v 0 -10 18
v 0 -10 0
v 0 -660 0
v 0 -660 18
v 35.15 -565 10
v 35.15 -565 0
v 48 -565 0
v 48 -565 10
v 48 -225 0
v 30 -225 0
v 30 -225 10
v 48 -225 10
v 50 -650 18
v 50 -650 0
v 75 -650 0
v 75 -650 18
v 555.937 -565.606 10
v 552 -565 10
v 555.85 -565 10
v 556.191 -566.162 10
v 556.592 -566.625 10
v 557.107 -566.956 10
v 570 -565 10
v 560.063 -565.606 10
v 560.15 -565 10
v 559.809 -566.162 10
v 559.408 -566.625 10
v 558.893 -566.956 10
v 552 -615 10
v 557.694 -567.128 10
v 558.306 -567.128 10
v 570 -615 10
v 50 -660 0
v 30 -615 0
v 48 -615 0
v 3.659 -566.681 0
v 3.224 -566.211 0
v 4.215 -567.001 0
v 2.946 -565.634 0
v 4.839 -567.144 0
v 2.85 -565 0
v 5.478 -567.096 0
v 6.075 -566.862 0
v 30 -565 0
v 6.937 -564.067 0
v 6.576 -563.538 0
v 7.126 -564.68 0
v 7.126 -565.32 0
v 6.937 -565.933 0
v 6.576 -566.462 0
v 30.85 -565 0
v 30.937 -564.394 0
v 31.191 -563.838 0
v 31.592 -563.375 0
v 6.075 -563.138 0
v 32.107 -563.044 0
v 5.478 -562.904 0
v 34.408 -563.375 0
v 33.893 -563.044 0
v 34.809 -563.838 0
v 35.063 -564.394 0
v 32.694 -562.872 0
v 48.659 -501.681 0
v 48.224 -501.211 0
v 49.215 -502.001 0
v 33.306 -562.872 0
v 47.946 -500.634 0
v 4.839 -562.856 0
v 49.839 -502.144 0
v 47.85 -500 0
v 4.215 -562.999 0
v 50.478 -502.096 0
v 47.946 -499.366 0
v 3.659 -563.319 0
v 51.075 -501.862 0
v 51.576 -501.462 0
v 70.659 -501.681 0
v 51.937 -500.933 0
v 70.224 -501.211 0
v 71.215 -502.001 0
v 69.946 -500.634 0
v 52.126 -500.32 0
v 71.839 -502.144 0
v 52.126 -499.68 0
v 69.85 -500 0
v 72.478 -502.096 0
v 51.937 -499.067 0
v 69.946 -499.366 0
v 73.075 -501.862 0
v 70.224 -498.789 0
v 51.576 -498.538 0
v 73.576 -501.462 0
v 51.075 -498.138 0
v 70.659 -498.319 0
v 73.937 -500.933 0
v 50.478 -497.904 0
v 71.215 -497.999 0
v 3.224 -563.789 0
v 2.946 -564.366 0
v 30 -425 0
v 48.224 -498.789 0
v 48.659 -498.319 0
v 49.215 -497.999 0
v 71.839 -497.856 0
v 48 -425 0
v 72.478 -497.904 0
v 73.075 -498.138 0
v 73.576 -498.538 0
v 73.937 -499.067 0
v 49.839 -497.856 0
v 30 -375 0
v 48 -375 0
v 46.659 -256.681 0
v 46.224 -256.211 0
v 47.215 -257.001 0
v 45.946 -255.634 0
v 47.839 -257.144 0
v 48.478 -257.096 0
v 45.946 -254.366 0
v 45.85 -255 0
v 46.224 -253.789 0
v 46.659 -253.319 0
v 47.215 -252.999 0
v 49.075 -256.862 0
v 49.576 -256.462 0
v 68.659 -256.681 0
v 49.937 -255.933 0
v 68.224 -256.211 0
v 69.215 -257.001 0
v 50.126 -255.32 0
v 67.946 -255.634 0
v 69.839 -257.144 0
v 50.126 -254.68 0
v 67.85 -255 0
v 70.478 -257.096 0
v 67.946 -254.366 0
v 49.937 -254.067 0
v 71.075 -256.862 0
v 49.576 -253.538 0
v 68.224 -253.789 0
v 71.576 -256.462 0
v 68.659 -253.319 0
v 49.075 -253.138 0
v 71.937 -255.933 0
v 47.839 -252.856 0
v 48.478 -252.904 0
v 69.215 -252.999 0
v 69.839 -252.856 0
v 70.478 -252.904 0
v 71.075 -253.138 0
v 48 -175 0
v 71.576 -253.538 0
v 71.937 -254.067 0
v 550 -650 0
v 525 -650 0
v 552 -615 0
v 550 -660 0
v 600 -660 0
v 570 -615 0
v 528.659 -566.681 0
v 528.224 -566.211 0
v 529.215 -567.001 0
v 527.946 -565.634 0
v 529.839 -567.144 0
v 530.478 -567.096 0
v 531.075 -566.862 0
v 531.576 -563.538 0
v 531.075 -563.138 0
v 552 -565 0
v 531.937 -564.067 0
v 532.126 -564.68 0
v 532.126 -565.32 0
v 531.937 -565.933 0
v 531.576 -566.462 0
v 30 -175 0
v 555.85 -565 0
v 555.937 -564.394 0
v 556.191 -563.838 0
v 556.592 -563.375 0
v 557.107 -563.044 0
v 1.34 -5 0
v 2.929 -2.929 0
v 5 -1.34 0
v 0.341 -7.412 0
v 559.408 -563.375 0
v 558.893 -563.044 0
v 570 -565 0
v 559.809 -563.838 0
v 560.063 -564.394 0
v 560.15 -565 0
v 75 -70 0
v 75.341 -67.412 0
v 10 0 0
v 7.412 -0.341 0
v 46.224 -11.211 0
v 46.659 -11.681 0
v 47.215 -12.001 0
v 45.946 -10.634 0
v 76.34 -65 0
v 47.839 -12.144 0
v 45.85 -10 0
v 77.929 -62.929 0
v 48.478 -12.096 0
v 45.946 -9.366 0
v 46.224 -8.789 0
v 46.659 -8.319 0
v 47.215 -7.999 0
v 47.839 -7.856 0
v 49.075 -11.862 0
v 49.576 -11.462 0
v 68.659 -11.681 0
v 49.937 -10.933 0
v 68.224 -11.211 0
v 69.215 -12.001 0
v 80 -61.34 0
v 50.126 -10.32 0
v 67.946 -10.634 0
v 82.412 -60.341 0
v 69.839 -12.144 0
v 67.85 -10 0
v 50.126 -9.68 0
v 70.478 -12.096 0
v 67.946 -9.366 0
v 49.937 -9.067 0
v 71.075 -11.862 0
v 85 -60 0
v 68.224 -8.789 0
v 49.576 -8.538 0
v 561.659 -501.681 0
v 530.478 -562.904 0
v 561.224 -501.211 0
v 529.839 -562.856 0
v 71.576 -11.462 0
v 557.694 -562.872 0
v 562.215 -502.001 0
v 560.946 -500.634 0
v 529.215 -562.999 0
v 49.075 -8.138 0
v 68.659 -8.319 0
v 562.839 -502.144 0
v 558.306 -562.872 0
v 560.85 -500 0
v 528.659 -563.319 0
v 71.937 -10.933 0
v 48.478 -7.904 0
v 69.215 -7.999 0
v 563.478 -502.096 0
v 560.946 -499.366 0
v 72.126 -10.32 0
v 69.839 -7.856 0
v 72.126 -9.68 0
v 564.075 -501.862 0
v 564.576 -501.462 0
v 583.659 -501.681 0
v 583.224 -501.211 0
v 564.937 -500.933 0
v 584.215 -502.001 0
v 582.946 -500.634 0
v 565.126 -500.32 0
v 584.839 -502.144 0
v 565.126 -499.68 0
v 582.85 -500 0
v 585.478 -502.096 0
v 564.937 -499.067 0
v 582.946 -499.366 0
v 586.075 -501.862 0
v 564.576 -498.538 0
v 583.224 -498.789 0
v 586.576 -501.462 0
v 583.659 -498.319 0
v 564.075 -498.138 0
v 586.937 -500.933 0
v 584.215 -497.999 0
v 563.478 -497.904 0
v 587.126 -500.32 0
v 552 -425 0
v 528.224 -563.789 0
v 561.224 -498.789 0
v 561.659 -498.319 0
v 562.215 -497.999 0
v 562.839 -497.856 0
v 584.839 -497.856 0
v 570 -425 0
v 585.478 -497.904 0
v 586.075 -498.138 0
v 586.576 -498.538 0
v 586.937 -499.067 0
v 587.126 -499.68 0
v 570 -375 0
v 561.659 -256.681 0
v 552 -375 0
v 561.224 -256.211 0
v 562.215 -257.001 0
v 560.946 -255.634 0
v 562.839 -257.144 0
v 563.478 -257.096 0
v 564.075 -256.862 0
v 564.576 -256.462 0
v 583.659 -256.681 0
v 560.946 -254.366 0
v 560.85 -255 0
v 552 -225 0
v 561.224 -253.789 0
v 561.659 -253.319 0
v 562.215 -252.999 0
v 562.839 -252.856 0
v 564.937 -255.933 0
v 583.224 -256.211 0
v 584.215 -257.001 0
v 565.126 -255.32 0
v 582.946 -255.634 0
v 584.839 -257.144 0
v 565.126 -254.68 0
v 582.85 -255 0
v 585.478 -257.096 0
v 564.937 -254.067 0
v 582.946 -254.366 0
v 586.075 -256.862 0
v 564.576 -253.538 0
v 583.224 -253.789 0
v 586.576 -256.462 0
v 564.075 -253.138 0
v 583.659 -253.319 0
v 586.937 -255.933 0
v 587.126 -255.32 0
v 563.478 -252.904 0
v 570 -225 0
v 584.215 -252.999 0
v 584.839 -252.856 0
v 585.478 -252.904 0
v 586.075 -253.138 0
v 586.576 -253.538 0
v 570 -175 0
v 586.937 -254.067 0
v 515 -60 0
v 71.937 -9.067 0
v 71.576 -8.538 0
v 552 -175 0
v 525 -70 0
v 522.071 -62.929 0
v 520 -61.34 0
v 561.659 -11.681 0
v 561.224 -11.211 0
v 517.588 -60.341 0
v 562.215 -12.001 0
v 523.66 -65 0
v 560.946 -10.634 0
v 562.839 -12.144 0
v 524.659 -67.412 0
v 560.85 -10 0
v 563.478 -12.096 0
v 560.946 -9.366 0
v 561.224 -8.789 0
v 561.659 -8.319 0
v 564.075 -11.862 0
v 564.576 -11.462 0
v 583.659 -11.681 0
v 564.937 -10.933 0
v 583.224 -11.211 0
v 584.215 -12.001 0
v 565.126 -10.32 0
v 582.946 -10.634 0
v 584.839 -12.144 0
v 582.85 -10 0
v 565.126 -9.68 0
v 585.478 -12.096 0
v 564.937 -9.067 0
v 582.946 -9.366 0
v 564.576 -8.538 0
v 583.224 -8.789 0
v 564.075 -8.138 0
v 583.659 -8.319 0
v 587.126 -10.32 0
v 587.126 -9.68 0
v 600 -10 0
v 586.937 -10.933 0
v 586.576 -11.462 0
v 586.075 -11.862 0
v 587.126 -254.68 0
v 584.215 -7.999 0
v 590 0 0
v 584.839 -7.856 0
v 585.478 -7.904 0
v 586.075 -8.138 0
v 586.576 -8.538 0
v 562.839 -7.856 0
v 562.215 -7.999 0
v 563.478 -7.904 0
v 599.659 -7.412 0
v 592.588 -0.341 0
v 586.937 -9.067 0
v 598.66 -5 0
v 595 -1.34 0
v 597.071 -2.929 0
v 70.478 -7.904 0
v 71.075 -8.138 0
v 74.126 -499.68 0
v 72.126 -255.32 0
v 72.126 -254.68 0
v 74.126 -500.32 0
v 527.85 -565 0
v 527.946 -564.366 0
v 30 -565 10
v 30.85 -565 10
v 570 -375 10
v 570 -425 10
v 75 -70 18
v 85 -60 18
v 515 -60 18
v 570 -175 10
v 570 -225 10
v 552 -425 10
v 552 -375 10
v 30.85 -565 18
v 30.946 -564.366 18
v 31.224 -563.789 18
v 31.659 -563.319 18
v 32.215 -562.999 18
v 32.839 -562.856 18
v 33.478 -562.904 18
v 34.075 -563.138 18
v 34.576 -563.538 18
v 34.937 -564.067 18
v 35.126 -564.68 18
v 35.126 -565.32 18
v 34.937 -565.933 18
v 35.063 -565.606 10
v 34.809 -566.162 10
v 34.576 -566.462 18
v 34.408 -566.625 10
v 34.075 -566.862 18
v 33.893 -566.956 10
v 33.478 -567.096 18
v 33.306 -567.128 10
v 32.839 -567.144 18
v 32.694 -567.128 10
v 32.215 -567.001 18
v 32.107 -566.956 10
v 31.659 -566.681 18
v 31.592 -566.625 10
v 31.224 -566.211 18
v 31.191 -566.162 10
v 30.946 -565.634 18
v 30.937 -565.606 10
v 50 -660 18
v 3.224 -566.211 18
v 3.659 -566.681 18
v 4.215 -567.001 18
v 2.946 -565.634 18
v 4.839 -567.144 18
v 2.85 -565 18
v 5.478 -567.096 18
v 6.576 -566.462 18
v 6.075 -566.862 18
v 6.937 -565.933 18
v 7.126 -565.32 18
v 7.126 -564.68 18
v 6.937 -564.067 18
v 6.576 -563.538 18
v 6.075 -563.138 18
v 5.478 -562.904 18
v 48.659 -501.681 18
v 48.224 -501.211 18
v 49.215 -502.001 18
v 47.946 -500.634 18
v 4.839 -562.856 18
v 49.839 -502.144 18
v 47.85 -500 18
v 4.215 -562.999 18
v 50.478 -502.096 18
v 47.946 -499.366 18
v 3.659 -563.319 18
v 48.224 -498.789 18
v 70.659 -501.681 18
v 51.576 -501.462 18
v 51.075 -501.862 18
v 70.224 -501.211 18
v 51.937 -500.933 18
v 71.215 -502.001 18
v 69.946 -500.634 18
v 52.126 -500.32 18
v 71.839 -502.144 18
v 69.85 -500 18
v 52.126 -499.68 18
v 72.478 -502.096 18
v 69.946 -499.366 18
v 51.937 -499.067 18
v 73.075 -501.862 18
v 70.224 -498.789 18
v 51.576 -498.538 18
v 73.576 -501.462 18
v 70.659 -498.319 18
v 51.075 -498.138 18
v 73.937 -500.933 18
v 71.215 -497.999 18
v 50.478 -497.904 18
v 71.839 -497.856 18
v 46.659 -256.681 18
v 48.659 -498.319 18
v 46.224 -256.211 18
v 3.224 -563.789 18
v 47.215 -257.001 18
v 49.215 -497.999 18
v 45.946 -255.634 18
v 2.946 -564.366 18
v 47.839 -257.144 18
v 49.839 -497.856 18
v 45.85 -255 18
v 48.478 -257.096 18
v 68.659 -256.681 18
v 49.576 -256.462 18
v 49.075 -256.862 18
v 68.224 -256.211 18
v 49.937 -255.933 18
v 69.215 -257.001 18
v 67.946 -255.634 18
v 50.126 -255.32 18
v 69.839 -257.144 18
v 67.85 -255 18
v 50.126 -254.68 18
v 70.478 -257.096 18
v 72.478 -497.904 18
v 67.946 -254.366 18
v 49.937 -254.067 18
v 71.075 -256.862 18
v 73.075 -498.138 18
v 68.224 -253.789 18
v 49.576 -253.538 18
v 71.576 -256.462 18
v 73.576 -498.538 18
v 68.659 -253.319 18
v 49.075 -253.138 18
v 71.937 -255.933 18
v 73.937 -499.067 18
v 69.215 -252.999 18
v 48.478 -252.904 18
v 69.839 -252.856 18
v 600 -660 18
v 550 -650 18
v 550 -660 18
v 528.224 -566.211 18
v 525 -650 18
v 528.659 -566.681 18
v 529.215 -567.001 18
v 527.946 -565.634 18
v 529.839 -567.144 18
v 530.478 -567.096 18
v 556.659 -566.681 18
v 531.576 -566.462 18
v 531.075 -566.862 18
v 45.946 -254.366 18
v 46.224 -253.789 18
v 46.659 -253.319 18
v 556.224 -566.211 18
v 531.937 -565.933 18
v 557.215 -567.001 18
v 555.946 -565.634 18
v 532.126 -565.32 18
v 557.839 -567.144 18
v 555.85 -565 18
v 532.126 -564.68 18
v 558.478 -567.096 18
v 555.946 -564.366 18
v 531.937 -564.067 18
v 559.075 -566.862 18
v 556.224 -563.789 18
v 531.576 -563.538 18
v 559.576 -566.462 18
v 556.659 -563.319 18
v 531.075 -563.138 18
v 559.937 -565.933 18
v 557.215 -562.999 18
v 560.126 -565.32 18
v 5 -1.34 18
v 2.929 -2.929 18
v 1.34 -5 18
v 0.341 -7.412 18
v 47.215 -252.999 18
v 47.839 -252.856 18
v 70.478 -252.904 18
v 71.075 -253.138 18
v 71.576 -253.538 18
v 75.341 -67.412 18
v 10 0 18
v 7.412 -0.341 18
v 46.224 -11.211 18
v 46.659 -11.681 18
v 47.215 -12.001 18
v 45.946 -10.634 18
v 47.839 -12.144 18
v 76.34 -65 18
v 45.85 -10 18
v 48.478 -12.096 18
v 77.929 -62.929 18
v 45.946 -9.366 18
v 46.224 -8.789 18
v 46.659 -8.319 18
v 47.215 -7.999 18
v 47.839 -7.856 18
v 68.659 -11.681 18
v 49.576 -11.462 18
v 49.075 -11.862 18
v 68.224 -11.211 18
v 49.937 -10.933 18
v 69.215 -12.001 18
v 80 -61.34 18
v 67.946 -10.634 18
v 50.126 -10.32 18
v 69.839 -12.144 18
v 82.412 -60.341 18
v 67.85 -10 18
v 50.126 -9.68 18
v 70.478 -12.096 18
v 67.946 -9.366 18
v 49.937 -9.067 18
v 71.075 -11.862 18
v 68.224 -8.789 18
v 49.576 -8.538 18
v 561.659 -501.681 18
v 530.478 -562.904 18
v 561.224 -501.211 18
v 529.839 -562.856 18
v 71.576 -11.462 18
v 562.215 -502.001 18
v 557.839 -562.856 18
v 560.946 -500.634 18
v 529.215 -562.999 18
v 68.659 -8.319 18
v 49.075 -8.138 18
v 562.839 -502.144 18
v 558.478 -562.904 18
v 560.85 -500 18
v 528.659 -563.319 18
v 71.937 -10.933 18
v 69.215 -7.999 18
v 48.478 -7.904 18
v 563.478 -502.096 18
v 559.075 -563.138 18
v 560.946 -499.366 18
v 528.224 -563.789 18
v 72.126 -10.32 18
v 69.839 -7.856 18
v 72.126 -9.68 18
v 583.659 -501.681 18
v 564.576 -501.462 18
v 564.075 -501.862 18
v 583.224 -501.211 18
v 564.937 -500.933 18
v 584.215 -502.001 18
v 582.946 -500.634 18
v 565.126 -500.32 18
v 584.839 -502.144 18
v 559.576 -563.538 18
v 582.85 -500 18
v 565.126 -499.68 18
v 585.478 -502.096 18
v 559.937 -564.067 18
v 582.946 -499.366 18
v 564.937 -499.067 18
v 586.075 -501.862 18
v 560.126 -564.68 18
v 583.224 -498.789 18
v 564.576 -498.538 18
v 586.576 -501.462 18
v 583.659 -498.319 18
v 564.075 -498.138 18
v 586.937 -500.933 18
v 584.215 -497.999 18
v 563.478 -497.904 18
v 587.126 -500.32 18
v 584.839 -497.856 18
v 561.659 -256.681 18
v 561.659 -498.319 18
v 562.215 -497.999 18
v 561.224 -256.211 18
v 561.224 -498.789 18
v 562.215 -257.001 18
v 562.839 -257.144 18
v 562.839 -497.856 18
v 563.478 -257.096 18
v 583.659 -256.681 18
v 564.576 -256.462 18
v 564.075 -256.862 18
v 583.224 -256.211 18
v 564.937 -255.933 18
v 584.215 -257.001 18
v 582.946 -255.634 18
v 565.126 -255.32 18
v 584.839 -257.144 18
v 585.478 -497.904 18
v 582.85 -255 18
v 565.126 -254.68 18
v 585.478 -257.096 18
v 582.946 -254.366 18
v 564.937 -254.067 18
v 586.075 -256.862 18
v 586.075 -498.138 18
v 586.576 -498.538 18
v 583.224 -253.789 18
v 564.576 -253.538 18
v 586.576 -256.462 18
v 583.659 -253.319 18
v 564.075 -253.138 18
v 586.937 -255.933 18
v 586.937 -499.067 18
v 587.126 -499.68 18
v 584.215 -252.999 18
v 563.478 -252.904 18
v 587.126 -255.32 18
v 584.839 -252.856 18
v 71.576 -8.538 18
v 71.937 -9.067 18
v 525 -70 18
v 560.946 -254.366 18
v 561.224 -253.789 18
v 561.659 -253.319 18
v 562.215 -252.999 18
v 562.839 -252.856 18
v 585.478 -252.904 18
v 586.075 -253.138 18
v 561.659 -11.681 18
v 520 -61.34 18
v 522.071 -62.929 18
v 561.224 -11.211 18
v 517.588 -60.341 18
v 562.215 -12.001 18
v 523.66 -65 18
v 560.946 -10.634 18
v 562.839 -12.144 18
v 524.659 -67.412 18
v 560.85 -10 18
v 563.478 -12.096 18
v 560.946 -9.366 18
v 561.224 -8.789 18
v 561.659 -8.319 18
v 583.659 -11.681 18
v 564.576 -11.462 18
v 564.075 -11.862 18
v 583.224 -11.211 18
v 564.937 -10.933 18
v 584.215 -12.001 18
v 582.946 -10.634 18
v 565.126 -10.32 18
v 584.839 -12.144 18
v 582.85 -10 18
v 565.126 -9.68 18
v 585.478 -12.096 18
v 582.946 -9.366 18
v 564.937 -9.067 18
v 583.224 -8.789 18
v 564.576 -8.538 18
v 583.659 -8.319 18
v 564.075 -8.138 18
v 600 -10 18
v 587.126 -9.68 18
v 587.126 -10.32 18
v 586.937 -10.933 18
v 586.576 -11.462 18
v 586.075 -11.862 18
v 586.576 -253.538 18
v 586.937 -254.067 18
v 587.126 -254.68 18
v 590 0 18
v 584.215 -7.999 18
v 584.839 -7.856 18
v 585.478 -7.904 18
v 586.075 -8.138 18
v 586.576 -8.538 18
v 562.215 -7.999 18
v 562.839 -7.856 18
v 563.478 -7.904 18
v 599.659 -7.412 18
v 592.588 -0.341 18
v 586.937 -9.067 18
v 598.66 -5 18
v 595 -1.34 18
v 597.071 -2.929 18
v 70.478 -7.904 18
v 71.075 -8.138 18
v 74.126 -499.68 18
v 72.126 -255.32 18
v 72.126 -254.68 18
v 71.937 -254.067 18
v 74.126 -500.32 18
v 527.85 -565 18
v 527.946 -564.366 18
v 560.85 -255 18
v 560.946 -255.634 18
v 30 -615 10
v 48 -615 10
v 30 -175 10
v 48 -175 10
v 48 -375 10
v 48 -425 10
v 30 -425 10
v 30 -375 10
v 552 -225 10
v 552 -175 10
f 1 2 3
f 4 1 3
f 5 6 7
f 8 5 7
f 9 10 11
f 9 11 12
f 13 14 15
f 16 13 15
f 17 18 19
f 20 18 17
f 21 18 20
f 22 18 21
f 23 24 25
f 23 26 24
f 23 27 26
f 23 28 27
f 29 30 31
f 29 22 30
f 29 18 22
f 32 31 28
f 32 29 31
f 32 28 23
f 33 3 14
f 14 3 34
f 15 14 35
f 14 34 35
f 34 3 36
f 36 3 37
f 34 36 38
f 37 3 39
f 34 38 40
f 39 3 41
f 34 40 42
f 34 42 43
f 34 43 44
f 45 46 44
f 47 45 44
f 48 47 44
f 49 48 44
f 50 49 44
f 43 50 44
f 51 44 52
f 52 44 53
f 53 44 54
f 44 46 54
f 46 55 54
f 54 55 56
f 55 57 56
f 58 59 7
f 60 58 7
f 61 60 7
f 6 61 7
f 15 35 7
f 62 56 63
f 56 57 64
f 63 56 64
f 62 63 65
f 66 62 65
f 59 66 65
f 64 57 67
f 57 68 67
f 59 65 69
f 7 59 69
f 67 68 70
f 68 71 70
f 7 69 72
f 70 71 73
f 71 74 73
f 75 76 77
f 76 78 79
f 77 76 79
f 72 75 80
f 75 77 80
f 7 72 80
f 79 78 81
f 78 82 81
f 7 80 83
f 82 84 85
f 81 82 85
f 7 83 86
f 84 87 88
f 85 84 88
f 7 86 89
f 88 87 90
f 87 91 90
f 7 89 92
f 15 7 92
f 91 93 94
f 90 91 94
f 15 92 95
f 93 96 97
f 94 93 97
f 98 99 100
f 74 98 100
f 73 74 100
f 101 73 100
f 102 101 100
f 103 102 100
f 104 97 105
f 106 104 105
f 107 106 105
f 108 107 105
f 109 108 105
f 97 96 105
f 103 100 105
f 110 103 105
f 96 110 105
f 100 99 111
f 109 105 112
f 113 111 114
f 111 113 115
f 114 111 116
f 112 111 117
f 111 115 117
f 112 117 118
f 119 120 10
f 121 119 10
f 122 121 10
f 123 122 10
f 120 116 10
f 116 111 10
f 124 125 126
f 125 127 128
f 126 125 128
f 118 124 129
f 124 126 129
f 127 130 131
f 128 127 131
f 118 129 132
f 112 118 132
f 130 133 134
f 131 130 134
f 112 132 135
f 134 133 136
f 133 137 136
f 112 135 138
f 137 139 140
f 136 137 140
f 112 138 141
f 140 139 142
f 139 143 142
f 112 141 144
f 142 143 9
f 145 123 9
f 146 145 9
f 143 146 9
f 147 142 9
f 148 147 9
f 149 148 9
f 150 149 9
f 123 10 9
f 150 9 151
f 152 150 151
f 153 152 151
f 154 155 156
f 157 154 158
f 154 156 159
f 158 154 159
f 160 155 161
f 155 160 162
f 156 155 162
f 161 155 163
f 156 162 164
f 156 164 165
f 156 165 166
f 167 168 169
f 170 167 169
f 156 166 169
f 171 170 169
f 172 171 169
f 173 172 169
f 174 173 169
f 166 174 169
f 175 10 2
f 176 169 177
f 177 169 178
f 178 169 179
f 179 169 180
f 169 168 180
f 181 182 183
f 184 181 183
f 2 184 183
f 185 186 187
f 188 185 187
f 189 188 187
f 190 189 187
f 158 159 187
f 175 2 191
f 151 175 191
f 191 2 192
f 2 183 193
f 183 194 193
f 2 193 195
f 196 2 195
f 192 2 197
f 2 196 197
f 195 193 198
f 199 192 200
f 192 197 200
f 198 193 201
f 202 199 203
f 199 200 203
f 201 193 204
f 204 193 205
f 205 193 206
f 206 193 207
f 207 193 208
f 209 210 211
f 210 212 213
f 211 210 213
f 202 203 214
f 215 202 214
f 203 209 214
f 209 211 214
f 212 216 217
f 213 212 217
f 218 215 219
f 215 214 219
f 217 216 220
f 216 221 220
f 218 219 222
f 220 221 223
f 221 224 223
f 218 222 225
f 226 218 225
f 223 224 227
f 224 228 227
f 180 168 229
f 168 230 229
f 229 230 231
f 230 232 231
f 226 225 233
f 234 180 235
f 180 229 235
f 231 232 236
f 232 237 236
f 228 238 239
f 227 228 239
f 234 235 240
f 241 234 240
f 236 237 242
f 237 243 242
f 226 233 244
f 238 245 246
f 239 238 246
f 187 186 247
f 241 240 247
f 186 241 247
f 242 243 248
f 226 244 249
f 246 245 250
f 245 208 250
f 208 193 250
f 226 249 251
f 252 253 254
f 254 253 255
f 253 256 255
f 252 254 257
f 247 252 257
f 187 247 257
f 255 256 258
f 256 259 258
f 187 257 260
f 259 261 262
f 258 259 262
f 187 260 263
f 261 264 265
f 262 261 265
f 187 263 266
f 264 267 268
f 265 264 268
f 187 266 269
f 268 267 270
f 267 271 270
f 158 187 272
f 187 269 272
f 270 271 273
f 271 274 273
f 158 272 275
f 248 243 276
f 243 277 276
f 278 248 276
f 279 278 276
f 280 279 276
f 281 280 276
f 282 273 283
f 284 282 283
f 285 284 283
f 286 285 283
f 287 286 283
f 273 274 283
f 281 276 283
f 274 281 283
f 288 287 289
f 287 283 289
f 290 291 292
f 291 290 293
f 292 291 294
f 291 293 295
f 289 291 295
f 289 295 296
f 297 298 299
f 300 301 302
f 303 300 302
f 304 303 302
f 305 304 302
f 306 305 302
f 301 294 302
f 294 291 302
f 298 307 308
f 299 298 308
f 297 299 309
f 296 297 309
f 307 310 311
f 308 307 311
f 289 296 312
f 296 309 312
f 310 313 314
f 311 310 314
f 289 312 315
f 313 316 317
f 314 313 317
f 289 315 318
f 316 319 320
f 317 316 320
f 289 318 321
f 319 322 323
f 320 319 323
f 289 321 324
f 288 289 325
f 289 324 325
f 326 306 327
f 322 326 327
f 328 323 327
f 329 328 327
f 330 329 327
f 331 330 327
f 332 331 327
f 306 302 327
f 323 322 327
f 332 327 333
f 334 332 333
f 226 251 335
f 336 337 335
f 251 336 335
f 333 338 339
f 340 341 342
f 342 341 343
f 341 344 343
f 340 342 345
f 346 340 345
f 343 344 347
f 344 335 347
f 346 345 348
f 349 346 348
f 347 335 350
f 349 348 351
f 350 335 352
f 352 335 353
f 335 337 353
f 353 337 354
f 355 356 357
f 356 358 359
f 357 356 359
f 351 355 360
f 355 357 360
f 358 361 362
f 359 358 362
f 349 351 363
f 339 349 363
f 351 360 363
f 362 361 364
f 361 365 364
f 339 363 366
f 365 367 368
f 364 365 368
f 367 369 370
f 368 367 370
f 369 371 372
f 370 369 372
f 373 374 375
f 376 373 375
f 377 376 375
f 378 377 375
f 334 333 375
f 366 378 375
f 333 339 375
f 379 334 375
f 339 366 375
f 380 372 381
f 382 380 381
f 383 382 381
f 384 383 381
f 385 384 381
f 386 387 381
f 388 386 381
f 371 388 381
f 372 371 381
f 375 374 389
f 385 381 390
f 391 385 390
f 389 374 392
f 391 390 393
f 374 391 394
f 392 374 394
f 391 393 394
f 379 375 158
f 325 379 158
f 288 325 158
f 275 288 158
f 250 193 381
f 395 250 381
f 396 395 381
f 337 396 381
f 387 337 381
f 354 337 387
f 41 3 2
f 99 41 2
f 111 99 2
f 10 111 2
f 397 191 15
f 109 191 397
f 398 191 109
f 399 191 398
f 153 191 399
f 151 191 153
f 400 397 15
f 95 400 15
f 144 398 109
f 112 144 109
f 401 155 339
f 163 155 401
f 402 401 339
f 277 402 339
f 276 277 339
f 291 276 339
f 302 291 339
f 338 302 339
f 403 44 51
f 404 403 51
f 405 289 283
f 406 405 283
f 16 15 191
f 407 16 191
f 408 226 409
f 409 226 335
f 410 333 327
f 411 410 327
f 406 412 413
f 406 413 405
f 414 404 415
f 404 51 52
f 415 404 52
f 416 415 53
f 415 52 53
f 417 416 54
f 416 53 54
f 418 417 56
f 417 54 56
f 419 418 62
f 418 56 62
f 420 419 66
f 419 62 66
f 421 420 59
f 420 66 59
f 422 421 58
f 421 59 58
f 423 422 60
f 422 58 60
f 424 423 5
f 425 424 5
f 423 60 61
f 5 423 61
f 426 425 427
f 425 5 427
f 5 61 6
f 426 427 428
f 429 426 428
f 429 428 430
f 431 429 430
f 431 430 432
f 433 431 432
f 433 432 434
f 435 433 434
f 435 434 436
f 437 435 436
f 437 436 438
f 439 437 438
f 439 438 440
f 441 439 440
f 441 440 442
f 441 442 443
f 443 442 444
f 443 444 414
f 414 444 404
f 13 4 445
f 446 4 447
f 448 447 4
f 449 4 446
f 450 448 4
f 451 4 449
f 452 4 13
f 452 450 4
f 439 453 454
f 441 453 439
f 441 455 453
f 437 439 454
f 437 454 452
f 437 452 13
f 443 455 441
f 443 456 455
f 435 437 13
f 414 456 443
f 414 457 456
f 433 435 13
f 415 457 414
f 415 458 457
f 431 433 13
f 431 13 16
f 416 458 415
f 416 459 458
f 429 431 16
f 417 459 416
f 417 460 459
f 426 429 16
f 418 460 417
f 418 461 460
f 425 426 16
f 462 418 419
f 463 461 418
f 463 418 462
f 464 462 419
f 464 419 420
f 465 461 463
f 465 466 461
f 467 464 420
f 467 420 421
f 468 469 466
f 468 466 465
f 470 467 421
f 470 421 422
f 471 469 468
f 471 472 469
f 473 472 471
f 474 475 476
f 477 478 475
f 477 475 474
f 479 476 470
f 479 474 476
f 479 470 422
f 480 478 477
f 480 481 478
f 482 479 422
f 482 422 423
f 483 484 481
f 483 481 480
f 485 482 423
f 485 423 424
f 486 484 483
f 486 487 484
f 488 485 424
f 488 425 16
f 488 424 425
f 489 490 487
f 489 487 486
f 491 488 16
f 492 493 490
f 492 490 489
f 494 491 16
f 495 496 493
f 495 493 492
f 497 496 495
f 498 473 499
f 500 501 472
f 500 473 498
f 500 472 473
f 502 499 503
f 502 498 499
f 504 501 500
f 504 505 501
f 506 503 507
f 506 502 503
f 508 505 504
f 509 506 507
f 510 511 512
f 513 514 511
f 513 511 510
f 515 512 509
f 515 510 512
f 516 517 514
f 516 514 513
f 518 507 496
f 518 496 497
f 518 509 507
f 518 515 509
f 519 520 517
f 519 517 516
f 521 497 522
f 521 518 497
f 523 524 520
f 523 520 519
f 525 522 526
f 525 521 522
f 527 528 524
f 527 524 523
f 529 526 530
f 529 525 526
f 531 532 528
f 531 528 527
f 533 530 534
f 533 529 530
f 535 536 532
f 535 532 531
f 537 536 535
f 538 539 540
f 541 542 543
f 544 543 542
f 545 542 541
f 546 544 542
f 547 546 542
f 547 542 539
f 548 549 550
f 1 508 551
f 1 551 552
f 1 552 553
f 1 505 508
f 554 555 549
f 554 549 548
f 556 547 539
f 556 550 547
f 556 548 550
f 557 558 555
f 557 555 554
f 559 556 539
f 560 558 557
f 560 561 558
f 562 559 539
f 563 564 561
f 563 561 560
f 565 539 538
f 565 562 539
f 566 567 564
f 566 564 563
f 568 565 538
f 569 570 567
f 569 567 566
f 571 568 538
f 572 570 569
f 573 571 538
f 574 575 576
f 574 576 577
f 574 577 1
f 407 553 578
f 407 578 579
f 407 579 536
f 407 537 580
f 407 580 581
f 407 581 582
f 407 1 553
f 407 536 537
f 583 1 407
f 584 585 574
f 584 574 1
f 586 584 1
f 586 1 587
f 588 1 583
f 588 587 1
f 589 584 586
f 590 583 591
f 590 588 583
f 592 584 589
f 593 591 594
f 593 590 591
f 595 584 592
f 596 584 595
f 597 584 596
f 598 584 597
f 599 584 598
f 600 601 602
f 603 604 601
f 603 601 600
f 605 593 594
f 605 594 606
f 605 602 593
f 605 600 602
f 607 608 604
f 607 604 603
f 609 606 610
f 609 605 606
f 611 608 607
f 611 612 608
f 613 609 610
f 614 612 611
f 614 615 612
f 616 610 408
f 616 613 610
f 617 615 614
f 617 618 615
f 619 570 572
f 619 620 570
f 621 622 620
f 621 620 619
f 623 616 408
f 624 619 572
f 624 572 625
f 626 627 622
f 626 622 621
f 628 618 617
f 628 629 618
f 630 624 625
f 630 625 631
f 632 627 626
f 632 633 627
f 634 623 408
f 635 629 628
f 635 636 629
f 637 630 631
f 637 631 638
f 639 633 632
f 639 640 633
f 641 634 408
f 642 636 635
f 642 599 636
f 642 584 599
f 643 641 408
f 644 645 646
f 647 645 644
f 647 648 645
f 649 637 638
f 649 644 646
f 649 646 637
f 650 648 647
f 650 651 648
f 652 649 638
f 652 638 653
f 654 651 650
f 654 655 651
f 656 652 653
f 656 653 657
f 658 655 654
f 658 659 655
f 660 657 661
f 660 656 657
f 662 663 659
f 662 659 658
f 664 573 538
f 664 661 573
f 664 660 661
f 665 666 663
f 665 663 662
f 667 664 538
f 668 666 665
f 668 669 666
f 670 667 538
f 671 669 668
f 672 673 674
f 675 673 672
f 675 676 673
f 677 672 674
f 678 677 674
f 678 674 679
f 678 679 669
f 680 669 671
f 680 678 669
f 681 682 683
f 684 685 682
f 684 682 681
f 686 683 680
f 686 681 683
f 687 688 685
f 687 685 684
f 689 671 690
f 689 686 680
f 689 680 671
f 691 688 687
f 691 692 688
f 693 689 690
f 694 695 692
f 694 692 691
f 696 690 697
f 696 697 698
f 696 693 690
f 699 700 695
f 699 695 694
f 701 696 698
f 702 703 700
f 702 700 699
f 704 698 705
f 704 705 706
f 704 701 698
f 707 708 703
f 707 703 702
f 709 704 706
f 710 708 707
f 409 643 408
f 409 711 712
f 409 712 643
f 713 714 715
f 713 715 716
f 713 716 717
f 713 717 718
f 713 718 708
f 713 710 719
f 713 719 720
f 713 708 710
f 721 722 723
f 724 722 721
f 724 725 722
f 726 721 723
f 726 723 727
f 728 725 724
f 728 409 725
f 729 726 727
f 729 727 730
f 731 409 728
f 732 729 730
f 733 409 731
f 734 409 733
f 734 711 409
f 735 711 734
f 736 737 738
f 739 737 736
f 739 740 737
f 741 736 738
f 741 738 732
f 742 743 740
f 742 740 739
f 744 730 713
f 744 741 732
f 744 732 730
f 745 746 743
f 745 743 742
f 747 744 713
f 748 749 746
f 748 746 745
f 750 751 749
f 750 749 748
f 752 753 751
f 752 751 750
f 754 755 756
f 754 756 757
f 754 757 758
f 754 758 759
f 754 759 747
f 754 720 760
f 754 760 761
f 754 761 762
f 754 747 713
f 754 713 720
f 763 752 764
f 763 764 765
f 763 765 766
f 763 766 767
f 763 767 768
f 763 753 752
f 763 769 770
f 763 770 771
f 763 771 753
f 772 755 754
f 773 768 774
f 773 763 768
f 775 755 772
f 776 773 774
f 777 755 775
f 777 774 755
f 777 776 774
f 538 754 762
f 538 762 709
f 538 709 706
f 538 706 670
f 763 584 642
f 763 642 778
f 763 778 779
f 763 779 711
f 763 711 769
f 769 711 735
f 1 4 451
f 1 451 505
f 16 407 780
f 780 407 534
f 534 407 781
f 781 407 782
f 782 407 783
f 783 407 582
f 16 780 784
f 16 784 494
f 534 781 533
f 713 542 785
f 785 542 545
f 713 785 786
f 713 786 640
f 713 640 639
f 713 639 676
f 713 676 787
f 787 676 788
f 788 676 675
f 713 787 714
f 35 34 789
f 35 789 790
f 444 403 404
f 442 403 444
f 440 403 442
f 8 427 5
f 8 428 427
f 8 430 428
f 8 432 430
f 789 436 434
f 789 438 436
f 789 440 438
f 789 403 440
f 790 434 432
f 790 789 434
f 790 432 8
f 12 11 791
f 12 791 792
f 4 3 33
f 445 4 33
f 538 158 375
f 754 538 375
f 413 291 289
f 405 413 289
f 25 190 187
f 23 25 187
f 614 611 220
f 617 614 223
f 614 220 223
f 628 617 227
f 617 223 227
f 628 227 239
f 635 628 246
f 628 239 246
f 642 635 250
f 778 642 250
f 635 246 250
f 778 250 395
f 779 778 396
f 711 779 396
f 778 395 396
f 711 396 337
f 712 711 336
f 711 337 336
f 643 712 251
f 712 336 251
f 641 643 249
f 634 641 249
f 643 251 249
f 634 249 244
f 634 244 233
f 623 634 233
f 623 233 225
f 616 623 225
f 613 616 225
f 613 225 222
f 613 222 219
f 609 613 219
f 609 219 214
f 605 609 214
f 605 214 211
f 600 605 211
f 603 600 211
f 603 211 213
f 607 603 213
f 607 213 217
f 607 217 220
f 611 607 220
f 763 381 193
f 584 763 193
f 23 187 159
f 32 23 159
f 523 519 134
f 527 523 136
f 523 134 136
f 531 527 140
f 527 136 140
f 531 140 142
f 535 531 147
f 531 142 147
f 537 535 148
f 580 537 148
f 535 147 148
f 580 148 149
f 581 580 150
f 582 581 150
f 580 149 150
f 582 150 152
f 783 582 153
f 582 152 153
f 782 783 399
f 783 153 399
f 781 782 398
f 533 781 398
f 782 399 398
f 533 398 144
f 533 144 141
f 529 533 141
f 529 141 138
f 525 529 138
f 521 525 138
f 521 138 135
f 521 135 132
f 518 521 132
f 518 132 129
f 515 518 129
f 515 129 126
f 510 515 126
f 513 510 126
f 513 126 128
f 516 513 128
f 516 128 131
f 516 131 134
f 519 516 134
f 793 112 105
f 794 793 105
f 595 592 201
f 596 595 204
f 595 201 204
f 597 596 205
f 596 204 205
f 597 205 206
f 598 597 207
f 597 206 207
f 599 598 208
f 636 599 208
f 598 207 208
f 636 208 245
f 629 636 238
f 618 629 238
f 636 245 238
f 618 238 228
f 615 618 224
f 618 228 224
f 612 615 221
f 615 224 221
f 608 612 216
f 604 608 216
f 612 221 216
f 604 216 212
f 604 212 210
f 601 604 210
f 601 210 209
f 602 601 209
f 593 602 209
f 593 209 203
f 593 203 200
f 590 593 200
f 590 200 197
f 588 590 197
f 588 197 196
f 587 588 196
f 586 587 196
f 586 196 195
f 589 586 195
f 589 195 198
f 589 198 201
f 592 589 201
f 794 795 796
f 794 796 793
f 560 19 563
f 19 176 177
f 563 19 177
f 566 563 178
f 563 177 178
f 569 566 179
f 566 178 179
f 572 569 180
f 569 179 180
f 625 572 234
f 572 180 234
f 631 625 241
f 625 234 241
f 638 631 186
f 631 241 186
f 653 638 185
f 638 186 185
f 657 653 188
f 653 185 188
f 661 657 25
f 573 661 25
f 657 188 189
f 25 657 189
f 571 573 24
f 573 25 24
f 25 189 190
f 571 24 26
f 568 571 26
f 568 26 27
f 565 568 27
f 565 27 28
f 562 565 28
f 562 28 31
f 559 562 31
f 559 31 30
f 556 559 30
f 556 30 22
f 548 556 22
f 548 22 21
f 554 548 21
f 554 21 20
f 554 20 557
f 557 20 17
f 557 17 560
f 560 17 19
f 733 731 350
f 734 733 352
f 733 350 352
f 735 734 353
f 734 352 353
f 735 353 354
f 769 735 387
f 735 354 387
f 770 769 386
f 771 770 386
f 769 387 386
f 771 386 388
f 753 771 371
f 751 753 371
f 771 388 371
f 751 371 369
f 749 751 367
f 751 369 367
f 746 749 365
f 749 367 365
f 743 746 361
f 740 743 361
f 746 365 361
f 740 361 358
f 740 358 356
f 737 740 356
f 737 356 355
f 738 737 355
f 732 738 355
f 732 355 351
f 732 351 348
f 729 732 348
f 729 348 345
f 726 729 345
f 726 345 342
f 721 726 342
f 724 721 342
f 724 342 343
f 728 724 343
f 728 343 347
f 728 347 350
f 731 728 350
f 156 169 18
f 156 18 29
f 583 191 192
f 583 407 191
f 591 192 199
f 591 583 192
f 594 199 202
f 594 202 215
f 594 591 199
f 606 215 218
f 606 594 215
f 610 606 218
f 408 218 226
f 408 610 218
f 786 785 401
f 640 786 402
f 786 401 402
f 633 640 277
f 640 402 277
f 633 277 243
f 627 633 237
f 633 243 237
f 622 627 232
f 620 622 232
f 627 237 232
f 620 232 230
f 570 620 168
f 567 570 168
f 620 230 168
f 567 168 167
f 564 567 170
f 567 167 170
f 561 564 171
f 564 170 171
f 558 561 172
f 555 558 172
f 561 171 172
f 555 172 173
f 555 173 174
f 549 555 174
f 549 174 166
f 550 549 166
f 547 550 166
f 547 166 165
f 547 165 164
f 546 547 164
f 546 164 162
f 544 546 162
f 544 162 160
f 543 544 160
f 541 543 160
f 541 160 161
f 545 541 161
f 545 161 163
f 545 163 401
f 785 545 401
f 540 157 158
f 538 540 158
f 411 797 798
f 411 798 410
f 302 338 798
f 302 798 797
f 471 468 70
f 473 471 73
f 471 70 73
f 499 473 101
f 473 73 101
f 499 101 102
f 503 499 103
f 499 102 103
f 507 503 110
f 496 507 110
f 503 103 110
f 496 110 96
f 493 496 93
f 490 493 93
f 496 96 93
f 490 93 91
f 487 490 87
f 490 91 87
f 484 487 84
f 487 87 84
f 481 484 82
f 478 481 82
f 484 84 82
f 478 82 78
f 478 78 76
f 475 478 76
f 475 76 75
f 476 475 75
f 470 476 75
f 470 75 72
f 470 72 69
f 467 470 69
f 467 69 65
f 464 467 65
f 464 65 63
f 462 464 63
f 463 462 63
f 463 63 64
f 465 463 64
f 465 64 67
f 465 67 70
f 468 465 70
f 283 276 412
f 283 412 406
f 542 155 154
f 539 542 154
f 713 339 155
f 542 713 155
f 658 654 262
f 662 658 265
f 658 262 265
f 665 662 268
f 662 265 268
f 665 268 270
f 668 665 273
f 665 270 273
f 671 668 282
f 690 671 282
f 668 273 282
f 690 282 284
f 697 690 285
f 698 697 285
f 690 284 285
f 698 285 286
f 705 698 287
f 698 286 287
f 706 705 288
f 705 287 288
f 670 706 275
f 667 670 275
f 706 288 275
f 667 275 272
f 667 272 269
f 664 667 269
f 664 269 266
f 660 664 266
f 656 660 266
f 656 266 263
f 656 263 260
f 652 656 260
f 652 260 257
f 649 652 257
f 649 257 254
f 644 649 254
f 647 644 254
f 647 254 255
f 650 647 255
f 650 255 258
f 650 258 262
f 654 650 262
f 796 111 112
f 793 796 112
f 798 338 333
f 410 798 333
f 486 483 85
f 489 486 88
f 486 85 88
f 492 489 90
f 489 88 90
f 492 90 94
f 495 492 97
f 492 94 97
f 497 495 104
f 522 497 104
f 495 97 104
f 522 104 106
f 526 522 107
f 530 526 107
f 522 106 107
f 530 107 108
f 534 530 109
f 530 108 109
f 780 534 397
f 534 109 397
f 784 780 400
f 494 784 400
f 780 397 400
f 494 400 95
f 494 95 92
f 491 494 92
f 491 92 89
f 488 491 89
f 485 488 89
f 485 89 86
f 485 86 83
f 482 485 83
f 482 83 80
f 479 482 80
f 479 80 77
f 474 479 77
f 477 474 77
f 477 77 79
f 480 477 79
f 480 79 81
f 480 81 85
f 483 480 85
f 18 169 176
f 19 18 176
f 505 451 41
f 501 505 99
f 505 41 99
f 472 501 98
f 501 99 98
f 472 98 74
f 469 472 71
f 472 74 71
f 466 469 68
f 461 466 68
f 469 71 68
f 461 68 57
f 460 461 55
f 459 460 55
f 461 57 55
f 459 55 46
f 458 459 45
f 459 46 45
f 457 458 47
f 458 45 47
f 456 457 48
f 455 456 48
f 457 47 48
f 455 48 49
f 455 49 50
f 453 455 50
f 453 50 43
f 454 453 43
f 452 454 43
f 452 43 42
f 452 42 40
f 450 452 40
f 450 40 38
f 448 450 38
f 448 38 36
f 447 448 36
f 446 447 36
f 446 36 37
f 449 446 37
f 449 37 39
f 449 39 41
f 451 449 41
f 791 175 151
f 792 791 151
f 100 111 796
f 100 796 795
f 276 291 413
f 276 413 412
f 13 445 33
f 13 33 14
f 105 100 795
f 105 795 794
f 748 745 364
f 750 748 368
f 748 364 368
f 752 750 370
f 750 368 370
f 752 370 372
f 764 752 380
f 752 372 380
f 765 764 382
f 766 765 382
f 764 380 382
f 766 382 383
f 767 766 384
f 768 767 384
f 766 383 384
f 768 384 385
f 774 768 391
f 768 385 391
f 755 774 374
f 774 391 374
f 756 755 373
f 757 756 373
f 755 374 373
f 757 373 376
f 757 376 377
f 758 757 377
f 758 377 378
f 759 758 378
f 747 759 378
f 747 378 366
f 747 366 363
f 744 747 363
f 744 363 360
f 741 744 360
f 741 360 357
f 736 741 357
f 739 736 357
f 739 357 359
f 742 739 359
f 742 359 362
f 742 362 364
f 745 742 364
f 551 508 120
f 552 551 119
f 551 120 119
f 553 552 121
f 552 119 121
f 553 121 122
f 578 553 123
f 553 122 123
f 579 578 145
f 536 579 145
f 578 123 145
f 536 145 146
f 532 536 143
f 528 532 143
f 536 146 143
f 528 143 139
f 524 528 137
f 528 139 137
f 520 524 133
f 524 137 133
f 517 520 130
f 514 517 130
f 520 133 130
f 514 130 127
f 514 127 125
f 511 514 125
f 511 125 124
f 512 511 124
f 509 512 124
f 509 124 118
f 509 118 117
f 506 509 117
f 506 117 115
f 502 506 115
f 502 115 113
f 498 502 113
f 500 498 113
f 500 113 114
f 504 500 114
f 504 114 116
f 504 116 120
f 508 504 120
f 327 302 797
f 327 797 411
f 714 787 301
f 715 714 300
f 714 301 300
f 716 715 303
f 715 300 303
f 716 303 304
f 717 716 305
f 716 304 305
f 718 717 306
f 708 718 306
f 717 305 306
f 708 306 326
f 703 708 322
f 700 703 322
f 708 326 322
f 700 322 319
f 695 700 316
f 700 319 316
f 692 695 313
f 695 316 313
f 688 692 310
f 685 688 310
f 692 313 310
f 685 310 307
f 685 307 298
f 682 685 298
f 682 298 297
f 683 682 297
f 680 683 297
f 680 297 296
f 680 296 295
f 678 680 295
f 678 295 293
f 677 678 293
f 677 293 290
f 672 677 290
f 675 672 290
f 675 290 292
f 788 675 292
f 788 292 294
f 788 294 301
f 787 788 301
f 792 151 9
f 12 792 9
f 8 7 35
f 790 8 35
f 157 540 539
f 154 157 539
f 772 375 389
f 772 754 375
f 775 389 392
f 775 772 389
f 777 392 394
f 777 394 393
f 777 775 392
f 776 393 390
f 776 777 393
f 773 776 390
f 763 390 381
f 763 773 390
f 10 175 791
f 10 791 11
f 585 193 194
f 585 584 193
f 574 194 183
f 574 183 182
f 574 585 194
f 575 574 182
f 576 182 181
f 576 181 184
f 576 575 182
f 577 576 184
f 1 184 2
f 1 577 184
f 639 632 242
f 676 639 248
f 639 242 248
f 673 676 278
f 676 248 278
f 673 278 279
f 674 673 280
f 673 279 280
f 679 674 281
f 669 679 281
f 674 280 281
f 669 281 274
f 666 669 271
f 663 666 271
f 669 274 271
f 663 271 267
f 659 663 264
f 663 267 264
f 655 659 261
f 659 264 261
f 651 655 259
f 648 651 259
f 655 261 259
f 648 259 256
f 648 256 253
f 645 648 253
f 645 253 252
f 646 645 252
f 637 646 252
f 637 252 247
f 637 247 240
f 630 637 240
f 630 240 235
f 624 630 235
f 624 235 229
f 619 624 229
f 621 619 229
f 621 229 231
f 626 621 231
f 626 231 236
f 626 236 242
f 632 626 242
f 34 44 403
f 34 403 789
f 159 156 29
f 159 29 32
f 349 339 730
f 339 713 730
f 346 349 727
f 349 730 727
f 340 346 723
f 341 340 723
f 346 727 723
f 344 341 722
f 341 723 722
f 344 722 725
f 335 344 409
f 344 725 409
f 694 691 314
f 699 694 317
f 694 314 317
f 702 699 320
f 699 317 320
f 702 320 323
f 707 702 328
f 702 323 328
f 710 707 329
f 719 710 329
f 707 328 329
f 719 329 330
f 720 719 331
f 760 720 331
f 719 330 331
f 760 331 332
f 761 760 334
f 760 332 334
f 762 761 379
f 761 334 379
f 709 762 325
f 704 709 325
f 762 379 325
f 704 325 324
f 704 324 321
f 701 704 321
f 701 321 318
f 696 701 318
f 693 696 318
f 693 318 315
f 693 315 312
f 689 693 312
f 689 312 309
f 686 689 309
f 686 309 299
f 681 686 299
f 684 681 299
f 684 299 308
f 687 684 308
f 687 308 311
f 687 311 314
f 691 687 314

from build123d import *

# Parameters (mm, degrees)
F0_W     = 50
F0_H     = 10
F1_DEPTH = 18
F2_W     = 18
F2_H     = 50
F3_DEPTH = 10
F5_D     = 4.3
F6_R     = 10
F7_R     = 10


# Not quite as in the source:
# - a feature names something its author has since deleted; it is built from what else it names


with BuildPart() as f1:
    # F0 (on Top) → F1 (new body)
    with BuildSketch(Plane.XY):
        Polygon((600, 0), (0, 0), (0, -650), (50, -650), (75, -650), (75, -60), (525, -60), (525, -650), (550, -650), (600, -650), align=None)
        with Locations((25, -655)):
            Rectangle(F0_W, F0_H)
        with Locations((575, -655)):
            Rectangle(F0_W, F0_H)
    extrude(amount=F1_DEPTH)

    # F2 (on face) → F3 (cut)
    with BuildSketch(Plane(origin=(0, 0, 0), x_dir=(1, 0, 0), z_dir=(0, 0, -1))):
        with Locations((39, 590)):
            Rectangle(F2_W, F2_H)
        with Locations((39, 400)):
            Rectangle(F2_W, F2_H)
        with Locations((39, 200)):
            Rectangle(F2_W, F2_H)
        with Locations((561, 200)):
            Rectangle(F2_W, F2_H)
        with Locations((561, 400)):
            Rectangle(F2_W, F2_H)
        with Locations((561, 590)):
            Rectangle(F2_W, F2_H)
    extrude(amount=-F3_DEPTH, mode=Mode.SUBTRACT)

    # F5 (through all)
    with Locations(Plane.XY.offset(18)):
        with Locations((563, -10), (585, -10), (563, -255), (563, -500), (585, -500), (585, -255), (48, -10), (70, -10), (48, -255), (70, -255), (50, -500), (72, -500), (530, -565), (558, -565), (5, -565), (33, -565)):
            Hole(F5_D / 2)

    # F6
    f6_edges = [f1.edges().sort_by_distance(p)[0] for p in [
        (75, -60, 9),
        (525, -60, 9),
    ]]
    fillet(f6_edges, radius=F6_R)

    # F7
    f7_edges = [f1.edges().sort_by_distance(p)[0] for p in [
        (600, 0, 9),
        (0, 0, 9),
    ]]
    fillet(f7_edges, radius=F7_R)


solid = f1.part
